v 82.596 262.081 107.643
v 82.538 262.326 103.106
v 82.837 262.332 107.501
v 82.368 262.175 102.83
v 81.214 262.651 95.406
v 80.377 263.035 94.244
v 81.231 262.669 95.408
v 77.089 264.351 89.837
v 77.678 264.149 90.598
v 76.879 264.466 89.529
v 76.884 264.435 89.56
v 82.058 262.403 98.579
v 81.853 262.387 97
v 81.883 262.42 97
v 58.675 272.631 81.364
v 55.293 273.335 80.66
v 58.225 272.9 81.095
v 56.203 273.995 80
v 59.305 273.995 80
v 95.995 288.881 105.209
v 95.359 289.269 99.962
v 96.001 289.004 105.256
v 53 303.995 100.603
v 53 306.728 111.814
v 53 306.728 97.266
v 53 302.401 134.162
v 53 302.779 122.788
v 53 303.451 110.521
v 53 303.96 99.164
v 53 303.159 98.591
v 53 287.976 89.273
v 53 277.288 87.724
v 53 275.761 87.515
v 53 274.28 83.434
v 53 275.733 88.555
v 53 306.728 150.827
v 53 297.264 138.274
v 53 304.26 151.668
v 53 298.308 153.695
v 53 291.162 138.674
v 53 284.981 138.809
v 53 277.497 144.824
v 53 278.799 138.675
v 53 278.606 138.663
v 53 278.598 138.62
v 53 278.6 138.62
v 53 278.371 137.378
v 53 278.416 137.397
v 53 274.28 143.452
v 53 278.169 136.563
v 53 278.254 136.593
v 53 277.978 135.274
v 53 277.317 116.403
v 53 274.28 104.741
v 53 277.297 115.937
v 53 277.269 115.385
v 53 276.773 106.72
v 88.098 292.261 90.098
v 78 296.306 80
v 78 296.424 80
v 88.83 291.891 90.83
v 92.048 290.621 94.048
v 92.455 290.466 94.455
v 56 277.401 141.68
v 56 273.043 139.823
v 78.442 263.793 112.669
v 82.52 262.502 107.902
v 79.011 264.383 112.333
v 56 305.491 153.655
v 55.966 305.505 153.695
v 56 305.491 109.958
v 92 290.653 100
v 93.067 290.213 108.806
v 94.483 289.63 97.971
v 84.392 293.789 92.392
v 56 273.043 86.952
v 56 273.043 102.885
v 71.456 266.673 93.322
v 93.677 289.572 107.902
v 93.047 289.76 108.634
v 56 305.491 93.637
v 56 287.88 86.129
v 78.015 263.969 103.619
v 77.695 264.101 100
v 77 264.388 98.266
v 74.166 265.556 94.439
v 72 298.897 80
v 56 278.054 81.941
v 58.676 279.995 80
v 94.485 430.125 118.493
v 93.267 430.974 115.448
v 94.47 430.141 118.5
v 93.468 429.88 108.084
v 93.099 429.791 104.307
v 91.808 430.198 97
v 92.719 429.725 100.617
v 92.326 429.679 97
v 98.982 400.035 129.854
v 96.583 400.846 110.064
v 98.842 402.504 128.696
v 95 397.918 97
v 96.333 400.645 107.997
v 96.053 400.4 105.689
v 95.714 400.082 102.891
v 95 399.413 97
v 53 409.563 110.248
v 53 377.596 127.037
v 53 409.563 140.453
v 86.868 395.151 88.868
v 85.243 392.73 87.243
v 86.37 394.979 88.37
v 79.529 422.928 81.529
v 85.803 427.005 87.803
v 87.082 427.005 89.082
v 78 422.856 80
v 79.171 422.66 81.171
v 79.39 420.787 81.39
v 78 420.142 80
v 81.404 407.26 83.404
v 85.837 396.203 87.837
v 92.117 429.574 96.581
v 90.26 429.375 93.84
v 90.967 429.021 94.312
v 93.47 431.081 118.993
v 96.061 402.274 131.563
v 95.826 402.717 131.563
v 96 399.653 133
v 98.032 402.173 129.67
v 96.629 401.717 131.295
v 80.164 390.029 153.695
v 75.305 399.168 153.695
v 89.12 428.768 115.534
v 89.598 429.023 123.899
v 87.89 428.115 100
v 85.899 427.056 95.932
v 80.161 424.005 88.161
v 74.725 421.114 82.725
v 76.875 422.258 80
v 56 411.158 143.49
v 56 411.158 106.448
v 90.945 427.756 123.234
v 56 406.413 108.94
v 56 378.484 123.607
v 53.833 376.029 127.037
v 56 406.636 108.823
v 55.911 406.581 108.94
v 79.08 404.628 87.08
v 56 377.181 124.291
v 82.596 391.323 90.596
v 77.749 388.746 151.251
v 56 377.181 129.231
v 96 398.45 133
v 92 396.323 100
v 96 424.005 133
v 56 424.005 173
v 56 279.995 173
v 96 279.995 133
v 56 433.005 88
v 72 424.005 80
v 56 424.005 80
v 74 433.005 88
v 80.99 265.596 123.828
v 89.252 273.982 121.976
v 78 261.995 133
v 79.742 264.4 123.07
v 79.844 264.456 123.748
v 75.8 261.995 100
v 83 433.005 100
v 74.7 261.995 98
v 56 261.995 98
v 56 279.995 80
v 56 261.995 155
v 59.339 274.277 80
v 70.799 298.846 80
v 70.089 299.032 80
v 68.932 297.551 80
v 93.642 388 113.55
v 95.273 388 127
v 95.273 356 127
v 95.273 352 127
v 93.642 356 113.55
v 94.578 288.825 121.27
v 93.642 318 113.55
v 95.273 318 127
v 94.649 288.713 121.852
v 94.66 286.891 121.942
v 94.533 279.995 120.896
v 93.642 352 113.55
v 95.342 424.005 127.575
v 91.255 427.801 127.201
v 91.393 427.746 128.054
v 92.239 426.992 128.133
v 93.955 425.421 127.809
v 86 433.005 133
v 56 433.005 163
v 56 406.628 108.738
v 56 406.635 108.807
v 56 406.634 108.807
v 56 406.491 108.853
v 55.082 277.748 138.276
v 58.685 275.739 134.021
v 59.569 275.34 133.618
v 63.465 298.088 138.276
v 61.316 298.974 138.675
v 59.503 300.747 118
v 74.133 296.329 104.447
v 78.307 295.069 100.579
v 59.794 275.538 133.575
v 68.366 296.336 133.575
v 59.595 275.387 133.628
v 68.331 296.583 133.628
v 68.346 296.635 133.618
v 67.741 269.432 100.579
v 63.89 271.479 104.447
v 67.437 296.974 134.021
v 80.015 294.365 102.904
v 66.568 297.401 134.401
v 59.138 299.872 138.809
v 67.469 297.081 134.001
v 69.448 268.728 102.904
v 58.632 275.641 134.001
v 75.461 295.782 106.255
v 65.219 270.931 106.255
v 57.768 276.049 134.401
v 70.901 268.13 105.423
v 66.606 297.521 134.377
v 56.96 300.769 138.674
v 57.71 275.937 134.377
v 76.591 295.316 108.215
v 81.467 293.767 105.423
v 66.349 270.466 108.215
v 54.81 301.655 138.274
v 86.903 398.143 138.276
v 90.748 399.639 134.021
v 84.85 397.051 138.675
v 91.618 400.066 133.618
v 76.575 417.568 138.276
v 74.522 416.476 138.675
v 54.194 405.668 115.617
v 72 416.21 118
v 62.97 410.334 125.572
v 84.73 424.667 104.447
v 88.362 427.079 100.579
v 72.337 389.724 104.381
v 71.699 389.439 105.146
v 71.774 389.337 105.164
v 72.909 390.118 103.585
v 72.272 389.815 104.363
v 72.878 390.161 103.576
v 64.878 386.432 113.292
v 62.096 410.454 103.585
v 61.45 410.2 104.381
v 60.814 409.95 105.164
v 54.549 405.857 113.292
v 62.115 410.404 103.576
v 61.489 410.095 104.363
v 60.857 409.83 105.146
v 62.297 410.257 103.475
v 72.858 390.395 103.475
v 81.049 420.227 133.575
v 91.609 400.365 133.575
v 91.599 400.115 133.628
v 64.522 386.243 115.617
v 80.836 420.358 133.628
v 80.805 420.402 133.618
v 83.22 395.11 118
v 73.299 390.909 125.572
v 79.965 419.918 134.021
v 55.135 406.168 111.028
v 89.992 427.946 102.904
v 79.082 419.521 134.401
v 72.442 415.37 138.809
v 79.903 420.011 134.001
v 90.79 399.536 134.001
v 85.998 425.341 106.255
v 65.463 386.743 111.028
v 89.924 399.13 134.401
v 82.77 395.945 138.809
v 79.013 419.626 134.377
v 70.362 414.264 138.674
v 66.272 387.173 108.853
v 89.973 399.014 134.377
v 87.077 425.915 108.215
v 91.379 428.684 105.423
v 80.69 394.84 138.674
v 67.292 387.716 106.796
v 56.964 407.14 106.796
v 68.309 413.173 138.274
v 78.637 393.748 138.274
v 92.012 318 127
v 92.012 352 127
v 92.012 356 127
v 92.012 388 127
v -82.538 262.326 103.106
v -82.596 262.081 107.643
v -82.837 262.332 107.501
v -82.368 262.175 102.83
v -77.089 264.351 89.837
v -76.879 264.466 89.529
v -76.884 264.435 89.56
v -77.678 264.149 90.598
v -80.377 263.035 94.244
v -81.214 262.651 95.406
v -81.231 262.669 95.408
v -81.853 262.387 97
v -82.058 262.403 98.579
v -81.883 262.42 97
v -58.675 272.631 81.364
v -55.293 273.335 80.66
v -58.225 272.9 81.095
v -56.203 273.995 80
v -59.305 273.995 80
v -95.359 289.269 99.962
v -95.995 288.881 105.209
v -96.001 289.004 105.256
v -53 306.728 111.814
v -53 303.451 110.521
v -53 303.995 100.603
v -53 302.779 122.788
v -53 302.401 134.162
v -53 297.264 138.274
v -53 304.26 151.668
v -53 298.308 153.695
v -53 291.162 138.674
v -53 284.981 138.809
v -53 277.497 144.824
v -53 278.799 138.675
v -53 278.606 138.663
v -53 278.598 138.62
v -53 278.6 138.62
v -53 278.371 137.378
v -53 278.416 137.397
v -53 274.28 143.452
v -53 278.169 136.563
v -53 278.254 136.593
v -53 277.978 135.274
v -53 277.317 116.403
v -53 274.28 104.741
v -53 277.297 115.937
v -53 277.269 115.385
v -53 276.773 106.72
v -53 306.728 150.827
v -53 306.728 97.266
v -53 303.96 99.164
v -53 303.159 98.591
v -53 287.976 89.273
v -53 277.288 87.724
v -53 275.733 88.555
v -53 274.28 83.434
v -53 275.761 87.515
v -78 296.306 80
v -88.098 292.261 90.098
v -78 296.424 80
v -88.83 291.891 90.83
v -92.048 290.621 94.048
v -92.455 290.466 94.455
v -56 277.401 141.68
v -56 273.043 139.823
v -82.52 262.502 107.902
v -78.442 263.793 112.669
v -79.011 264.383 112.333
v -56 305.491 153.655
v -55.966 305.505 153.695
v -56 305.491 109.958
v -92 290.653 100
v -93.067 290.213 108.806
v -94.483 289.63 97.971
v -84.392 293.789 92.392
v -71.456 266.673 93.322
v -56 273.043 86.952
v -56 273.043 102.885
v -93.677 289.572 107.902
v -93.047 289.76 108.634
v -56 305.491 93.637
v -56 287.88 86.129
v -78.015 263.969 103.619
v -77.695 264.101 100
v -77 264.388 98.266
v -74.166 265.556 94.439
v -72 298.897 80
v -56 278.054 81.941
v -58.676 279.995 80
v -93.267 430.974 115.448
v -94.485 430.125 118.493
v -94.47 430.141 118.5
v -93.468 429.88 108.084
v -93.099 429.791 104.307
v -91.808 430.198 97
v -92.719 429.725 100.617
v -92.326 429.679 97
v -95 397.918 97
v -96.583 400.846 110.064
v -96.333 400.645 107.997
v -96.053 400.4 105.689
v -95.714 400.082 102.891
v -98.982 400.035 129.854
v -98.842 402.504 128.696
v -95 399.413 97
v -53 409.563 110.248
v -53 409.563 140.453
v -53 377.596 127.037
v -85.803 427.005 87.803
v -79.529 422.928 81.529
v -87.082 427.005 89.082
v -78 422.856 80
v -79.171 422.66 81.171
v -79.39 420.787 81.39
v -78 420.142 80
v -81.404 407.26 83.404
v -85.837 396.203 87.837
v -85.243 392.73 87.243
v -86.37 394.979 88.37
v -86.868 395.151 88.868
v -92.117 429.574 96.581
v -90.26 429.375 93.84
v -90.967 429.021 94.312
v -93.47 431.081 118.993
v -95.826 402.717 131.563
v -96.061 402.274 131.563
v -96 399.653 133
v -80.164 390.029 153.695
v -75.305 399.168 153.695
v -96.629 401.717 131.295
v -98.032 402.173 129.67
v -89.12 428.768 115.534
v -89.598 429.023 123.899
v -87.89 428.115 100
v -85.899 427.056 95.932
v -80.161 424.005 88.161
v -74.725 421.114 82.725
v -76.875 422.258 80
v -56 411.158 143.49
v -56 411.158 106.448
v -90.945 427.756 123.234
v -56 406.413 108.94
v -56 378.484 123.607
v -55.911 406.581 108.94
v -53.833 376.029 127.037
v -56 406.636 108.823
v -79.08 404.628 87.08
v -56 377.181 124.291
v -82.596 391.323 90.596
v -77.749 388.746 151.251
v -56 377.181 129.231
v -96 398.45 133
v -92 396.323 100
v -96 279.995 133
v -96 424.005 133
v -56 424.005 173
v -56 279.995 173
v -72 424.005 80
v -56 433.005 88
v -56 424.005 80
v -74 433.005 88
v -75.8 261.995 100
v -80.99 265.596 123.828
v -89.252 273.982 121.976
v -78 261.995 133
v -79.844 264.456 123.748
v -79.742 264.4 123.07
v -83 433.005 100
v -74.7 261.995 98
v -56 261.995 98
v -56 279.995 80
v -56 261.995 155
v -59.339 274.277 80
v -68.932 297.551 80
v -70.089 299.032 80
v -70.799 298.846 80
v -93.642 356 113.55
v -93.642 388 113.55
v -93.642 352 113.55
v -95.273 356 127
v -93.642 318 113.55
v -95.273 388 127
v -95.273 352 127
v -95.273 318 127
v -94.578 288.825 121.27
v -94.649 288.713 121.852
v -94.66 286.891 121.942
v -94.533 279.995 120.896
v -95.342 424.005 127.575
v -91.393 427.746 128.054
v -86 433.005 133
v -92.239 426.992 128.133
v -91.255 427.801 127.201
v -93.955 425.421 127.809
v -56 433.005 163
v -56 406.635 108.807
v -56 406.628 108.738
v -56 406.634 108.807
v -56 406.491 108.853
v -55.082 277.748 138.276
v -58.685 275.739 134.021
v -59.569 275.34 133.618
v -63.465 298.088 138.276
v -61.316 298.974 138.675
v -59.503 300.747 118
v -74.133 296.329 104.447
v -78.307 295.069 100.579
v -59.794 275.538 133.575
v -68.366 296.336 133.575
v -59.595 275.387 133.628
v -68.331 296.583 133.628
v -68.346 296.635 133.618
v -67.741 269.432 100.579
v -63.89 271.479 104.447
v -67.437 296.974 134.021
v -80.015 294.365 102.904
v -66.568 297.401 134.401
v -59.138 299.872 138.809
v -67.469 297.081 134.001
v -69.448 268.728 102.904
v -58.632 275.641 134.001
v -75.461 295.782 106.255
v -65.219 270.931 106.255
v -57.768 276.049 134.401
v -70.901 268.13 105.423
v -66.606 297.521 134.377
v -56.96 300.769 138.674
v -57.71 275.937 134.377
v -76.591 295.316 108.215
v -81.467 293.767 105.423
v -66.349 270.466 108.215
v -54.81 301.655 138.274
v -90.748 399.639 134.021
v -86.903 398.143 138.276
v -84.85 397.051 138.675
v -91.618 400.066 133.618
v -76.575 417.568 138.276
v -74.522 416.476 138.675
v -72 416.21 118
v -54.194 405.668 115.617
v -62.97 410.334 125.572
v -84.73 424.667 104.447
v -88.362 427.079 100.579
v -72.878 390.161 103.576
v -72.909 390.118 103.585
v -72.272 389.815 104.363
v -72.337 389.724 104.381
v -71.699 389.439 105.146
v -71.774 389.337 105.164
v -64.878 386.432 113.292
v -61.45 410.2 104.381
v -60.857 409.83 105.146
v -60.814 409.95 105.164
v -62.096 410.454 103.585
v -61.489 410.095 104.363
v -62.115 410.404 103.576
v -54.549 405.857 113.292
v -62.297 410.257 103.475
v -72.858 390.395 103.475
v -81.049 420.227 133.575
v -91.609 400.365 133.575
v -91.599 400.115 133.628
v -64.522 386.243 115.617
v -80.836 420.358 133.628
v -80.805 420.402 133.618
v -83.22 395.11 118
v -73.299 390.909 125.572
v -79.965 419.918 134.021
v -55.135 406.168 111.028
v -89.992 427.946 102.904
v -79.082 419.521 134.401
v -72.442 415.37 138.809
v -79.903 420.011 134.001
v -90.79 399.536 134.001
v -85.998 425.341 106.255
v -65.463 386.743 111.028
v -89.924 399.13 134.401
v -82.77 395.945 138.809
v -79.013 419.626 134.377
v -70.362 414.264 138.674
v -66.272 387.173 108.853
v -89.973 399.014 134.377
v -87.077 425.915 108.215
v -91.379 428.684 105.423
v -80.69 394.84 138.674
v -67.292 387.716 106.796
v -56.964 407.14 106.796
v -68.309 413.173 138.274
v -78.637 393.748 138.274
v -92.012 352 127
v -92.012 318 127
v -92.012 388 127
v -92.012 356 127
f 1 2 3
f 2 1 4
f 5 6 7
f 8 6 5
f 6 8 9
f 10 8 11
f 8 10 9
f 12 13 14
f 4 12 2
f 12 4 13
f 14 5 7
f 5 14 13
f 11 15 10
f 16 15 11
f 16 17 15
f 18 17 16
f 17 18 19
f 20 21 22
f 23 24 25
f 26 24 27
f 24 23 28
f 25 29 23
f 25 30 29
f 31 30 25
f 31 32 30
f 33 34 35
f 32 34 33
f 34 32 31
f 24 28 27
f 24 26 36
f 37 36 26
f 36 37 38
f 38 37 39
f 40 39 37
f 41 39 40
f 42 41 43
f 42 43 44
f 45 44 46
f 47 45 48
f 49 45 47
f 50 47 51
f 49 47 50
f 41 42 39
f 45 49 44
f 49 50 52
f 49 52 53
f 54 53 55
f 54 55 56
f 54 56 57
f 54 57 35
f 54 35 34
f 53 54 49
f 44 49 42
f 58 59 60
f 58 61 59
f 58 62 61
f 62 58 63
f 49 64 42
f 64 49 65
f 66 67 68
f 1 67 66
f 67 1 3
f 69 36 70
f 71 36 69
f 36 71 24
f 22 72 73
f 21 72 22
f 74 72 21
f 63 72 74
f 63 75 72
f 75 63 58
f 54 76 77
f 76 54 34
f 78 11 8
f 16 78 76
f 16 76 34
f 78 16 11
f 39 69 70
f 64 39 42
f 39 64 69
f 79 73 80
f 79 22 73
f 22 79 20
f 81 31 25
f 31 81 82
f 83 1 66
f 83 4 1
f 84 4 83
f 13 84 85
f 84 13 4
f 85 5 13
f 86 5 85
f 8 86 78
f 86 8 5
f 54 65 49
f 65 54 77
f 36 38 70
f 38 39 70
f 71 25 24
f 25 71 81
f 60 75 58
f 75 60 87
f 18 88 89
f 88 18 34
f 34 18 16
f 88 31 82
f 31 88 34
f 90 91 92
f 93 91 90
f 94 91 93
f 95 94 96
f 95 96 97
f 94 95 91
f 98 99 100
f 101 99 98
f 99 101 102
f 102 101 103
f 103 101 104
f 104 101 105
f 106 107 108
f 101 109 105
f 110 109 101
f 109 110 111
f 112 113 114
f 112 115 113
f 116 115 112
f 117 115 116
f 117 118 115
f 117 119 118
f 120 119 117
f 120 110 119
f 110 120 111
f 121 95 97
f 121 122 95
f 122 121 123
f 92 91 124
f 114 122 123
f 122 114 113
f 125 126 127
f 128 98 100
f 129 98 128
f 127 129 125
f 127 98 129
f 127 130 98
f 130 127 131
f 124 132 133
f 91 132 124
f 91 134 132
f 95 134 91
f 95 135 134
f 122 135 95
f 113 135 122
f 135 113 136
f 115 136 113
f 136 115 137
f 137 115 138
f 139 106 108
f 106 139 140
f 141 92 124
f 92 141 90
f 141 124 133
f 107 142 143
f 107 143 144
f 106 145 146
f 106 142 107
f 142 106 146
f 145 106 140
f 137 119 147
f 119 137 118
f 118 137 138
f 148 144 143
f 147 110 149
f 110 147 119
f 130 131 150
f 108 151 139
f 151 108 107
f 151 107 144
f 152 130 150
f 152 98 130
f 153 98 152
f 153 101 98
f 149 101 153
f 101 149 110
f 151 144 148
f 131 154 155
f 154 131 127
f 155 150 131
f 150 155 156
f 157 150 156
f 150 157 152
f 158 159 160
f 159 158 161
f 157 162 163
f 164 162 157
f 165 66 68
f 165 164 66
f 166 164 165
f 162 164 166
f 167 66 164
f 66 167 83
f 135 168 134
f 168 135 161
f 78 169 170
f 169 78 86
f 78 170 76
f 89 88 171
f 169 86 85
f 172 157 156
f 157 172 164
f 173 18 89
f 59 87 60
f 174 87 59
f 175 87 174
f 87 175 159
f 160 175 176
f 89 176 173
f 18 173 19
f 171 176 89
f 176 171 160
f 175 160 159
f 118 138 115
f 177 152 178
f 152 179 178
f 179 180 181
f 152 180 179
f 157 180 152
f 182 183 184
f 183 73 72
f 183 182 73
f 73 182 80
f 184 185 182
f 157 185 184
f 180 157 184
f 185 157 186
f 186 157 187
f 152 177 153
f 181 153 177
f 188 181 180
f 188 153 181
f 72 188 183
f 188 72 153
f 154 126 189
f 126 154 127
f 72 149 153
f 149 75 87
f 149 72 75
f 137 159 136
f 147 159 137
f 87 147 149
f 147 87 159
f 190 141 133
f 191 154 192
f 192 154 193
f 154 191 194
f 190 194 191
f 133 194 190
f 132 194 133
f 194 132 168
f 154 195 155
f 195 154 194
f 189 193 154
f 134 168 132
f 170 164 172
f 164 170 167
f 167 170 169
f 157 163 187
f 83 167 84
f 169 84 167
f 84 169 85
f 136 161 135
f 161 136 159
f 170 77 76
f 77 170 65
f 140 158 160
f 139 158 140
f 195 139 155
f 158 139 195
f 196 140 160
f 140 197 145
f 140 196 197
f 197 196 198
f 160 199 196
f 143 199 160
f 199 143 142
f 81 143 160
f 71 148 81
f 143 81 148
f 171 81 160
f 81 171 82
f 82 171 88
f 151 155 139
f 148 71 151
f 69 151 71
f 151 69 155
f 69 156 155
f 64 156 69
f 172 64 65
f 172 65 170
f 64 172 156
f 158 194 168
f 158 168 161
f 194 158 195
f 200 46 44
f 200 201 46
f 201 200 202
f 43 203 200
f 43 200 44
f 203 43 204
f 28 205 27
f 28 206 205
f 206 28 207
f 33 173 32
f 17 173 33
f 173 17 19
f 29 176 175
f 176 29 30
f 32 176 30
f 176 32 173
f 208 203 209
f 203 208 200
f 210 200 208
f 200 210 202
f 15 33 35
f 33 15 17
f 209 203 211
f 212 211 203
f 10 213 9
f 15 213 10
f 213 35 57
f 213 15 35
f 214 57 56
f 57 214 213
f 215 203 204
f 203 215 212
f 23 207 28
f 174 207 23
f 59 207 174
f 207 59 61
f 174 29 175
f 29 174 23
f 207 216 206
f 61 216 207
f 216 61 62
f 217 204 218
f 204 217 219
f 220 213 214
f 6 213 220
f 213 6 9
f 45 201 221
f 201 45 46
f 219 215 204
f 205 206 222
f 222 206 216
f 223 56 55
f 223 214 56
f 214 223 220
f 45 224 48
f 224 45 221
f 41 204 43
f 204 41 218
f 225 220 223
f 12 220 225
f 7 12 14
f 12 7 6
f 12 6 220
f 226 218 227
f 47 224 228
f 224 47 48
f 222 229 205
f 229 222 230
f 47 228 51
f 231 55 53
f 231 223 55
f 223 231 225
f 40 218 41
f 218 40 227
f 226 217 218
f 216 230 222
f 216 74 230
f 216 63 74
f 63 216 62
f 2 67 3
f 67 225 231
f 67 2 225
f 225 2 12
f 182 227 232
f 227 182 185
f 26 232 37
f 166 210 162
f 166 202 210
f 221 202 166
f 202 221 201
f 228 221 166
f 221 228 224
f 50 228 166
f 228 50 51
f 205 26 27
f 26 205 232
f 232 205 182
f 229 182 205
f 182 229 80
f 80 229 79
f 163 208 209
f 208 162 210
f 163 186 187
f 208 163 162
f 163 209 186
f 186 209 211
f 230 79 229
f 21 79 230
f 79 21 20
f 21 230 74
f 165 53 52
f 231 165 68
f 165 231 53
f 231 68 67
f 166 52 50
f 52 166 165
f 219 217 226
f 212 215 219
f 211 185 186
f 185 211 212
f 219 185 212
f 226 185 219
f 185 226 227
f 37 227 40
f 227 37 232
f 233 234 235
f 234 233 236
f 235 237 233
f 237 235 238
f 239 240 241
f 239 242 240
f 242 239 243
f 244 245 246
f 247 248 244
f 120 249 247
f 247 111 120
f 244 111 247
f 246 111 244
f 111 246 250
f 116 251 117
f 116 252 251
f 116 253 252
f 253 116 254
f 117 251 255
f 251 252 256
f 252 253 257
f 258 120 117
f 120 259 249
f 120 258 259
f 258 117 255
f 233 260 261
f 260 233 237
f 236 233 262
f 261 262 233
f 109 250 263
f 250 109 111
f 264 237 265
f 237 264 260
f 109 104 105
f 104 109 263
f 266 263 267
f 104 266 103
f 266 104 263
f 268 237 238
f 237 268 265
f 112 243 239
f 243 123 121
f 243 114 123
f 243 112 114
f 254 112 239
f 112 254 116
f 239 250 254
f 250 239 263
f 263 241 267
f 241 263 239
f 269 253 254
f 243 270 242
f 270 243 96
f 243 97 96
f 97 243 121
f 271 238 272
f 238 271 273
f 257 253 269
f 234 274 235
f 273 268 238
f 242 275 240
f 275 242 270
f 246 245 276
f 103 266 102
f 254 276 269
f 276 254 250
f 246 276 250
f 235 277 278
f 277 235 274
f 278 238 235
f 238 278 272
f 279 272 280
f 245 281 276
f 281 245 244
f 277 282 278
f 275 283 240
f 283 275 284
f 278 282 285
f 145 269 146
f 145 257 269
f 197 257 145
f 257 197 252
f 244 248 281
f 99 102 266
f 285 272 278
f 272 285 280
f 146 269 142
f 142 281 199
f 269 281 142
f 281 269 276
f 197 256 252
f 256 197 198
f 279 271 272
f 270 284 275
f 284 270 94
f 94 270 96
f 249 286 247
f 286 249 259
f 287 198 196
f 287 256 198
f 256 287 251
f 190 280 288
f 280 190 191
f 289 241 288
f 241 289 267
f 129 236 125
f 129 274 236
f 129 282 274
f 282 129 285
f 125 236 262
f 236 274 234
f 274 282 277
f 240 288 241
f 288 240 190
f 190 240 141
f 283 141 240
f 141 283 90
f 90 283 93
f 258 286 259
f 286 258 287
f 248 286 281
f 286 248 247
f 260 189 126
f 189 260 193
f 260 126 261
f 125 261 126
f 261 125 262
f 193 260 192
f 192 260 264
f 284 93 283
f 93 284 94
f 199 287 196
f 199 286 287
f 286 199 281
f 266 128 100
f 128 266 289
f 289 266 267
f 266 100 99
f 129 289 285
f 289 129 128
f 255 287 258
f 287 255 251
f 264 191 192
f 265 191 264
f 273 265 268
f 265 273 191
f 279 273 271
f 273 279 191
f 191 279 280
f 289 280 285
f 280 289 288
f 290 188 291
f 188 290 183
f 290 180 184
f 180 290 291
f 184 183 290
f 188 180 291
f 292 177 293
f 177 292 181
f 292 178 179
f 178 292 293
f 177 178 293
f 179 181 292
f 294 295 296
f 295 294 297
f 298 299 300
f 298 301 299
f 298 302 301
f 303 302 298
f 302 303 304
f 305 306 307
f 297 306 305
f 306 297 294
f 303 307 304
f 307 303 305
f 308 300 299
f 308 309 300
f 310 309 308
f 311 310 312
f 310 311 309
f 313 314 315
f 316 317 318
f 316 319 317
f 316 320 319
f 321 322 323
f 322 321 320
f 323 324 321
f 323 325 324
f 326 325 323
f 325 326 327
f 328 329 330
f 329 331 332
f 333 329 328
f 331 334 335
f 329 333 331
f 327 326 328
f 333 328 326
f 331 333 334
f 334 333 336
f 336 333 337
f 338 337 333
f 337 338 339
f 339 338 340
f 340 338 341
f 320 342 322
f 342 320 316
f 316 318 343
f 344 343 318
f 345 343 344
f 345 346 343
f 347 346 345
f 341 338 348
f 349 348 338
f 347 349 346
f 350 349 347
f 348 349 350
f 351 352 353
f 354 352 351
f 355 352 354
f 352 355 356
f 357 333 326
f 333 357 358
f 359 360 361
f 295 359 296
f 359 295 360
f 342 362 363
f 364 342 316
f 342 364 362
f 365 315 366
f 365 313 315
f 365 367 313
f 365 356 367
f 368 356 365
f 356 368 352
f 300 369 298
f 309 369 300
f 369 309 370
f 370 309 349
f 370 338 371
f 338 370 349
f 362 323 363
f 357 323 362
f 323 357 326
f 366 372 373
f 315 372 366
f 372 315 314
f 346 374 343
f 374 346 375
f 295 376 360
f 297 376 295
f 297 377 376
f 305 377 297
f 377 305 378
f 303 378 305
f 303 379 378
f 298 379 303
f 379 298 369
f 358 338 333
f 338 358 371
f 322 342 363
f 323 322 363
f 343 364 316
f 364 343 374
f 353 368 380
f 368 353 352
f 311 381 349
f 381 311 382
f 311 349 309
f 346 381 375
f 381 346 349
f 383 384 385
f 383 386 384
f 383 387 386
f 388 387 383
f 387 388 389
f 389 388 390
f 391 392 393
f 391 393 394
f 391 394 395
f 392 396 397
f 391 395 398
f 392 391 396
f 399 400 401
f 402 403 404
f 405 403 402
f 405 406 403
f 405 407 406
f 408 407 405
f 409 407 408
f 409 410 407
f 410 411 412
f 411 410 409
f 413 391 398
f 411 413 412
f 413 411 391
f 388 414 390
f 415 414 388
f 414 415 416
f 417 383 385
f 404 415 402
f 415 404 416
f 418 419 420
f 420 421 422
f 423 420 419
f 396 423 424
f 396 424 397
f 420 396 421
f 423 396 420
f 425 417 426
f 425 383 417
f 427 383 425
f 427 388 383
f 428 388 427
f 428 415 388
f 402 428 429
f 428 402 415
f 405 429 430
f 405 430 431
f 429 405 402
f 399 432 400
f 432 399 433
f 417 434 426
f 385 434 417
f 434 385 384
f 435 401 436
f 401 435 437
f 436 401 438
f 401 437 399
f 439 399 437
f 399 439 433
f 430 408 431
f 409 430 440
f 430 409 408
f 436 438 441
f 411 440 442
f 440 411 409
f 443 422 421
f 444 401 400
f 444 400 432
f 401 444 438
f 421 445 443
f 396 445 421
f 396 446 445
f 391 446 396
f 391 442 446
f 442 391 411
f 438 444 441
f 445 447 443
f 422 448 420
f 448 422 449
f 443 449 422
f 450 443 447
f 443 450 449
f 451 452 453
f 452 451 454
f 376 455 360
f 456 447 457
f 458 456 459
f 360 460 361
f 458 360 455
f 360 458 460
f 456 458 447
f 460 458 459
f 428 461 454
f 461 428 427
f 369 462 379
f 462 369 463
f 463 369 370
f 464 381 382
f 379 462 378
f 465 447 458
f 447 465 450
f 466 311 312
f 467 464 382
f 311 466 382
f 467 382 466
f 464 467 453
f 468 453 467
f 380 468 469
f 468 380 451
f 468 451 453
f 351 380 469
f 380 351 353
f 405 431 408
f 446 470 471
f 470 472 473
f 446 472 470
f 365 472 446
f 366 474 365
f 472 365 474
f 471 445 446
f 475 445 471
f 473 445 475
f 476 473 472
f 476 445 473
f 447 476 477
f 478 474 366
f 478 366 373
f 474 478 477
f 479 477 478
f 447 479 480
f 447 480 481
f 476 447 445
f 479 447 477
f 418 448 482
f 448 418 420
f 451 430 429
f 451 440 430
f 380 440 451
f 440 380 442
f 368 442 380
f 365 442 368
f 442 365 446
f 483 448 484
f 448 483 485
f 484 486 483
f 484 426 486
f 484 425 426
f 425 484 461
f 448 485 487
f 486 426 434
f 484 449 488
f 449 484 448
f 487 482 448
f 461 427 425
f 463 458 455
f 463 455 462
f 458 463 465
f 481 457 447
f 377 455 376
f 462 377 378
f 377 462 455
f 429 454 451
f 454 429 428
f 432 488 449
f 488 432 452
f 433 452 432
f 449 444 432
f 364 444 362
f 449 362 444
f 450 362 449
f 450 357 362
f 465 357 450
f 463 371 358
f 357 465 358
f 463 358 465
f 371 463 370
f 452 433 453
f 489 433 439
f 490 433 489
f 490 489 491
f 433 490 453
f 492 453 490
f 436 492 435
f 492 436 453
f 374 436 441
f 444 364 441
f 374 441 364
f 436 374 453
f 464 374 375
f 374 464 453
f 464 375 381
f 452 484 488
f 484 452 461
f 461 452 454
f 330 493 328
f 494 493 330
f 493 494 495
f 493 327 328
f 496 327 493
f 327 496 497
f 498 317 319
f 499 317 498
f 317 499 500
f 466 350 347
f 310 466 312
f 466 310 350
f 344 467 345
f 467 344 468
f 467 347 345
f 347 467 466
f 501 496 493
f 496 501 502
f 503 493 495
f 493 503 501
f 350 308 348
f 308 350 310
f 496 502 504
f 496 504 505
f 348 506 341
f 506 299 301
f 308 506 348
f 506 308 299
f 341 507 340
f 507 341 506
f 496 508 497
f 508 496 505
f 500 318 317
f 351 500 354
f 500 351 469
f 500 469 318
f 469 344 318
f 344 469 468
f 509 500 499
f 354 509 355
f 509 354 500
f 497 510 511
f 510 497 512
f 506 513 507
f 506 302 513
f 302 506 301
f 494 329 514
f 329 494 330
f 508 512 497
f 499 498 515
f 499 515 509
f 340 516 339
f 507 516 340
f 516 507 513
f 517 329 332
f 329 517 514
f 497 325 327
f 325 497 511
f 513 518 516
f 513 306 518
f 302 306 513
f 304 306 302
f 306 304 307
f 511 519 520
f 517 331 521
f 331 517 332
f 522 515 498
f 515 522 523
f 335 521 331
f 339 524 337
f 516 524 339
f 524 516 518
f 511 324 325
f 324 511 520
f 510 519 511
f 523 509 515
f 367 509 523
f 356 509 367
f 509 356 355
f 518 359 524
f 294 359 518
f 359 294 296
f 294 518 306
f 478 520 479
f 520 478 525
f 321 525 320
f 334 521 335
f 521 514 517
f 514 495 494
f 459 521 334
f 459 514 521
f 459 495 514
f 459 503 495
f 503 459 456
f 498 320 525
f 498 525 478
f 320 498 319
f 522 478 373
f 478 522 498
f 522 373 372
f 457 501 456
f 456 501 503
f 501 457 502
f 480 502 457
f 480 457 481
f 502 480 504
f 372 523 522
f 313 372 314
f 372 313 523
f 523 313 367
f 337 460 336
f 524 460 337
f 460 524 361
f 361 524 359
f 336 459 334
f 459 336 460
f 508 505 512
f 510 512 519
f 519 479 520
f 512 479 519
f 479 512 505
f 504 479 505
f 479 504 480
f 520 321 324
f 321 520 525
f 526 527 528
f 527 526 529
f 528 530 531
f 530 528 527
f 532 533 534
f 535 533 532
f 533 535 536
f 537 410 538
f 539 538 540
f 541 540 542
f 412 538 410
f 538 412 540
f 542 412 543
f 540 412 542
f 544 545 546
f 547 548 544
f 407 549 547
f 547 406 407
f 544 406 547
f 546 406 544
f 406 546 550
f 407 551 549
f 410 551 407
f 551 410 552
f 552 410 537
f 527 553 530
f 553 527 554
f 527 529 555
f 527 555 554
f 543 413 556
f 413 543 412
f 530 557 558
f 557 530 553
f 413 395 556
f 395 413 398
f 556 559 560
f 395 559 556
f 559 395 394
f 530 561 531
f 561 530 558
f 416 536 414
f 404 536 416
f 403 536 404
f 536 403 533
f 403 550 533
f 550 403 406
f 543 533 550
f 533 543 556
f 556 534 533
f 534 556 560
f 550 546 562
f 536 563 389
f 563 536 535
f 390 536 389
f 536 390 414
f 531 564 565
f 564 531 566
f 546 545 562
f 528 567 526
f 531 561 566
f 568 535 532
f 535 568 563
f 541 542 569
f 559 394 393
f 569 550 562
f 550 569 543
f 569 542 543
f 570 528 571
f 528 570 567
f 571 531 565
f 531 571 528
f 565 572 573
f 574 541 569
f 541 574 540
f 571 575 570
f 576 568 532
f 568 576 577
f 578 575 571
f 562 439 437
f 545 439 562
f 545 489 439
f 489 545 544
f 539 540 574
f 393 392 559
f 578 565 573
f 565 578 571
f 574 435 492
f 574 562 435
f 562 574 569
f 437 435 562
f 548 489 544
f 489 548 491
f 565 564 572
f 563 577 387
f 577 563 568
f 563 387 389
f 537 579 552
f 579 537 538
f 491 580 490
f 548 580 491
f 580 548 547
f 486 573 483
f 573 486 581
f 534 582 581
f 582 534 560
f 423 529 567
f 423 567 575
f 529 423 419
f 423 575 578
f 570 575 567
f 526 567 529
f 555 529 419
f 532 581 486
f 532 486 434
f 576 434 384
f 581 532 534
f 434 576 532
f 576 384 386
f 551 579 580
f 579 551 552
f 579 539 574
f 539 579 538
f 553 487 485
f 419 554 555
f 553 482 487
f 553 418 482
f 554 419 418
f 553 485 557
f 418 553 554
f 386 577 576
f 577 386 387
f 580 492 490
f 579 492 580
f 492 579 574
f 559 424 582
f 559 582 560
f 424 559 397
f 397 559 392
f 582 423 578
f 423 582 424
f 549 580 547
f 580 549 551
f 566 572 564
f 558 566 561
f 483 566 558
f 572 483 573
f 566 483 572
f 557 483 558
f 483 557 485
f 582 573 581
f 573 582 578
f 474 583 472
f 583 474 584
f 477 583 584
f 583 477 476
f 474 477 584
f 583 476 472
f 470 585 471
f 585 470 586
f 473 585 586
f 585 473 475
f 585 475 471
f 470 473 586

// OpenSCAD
// file: ../hull_datums.scad
// hull_datums.scad -- GENERATED by tools/hull_datums.py --write-scad.
// Do not edit: change tools/hull_datums.py and regenerate.
// Aircraft datum R2: origin centreline / nose tip / ground plane on the
// 3.0 in gear; X = +port, Y = +aft, Z = +dorsal (mm).
X_CL = 0.0000;
Y_NOSE = 0.0000;
GROUND_Z_3IN = 0.0000;
BELLY_Z = 80.0000;
WING_LE_ROOT_Y = 311.4000;
SPAR_Y = 339.4000;
SPAR_Z = 146.8510;
SHAFT_Y = 365.0000;
CARGO_BAY_Y_FWD = 304.7000;
CARGO_BAY_Y_AFT = 410.7000;
// main file
// gear_box_canonical_concept.scad -- CONCEPT envelope of the canonical
// landing-gear box (cargo-flank "gear sponson") and its leg-support pillars.
//
// STATUS: CONCEPT / appearance study only (2026-11-01).  NOT integrated:
// no keep-outs, no bolt pattern, no wall/shell, no mass.  It exists so the
// owner can approve the LOOK before the integration work in
// docs/plans/2026-11-01-001-feat-canonical-gear-box-plan.md.
//
// Problem it answers (owner, 2026-11-01): the Rev R6/A1B bays are open bolt
// frames on the 25 deg sponson panel; the thigh hub hangs in free air below
// them, so there is a visible gap between the bottom of each leg support and
// the hull, and the bay reads as a box added onto a different design.
//
// Canonical form, read from Nick Henning's model [REF-CAD-HENNING]:
//   * nick-henning-uvdisplay-wing.jpg -- the stub wing IS the top plate; the
//     gear box hangs under it as a faceted block whose outboard face leans in
//     toward a bevelled lower chine, with recessed panels and an angled hatch.
//   * nick-henning-close-gear-combine.jpg -- each thigh is SLEEVED in a square
//     leg-support pillar that lands on the box; the thigh emerges from the
//     pillar mouth, so support and hull read as one structure.
//   * nick-henning-uvdisplay-gear.jpg -- the upper-leg housing is a square
//     tube coaxial with the thigh.
//
// Frame: aircraft datum R2 (tools/hull_datums.py): X lateral (port = +X),
// Y aft, Z up, mm.  Built for PORT and mirrored about X_CL for starboard.
// Corner poses are COPIED from merge_cargo_interior.py LG_CORNERS /
// canonical_leg_r6_3_0in.scad CORNERS (R2) -- the integration step shall
// read them from one source instead (plan U2).
//
// Author: Claude (Claude Opus 5.5, Anthropic) under the direction of
// Stab-Rabbit-coding, per AGENTS.md AI attribution.
// License: CERN-OHL-P-2.0 (hardware source) -- see repo LICENSE files.

PART = "both";          // "port" | "stbd" | "both"
include <../hull_datums.scad>   // X_CL etc. (GENERATED from tools/hull_datums.py)

// [hip_x, hip_y, hip_z, swing_azimuth_deg] -- port rows, R2
FORE = [54.95, 289.70, 118.0, -22.4];
AFT  = [77.61, 405.66, 118.0,  28.0];

KNEE_L   = [59, 0, -66];  // leg-local knee centre (canonical_leg_r6_3_0in KNEE)
FLEX_MAX = 26;            // deg, gear stroke swept by the bay check

// --- box section (X, Z) at the full-depth stations --------------------------
BOX_Z_BOT   = 80.0;       // belly plane
BOX_Z_TOP   = 133.0;      // wing-root underside (wing is the canonical top plate)
// Owner 2026-11-01: no shelf in front of the wing root -- the box top is a
// face sloping up-inboard from the outboard face edge at TOP_SLOPE, so it
// runs INTO the hull skin (a clean skin joint) wherever the wing is not
// above it.  Under the wing the top is then trimmed to the wing's own
// underside contour by tools/gear_box_concept_fit.py.
TOP_SLOPE   = 45;         // deg above horizontal
BOX_X_IN    = 56.0;       // inboard edge -- outboard of the door aperture (X 52.25)
BOX_X_FACE_T = 96.0;      // outboard face, top
BOX_X_FACE_B = 92.0;      // outboard face, bottom (face leans in, as canon)
BOX_Z_CHINE = 100.0;      // top of the bevelled lower chine
BOX_X_CHINE_B = 72.0;     // chine meets the bottom

Y_FWD_TIP = 262.0;        // fore face toe (sloped front face)
Y_FWD     = 280.0;        // full section begins
Y_AFT     = 424.0;        // full section ends
Y_AFT_TIP = 433.0;        // aft face, stops short of the cargo/middle collar (434.7)

// --- leg-support pillar (square sleeve coaxial with the static thigh) -------
PIL_W_SWING = 40.0;       // across the thigh, in the swing plane
PIL_W_PIN   = 30.0;       // along the hip pin
PIL_UP      = 30.0;       // run up/inboard of the hip (buried in the box)
PIL_DOWN    = 90.0;       // run down the thigh from the hip (clipped to the box)
SLOT_SWING  = 34.0;       // thigh cluster clearance (2 x O14 @ 18 + 2 mm)
SLOT_PIN    = 22.0;       // lug 14 + 2 x 4 mm, at the hip (narrow end)
// Owner 2026-11-01: the bay opening is TRAPEZOIDAL, as canon, and stays an
// OPEN slot.  It flares along the pin axis from SLOT_PIN at the hip to
// SLOT_PIN_MOUTH where the thigh leaves the box, so on the box face it reads as
// a trapezoid wide at the bottom (Henning close-gear: the leg recesses widen
// toward the chine).  34 = the Rev R6 aperture head width (BAY_APER_W_TOP).
SLOT_PIN_MOUTH = 34.0;
SLOT_FLARE_L   = 70.0;    // mm down the thigh over which the flare runs

function unit(v) = v / norm(v);
THIGH_ANG = atan2(-KNEE_L[2], KNEE_L[0]);   // 48.2 deg below local +x

module section(xs) {
    // xs scales the section outboard of BOX_X_IN (end tapers)
    function sx(x) = BOX_X_IN + (x - BOX_X_IN) * xs;
    polygon([[BOX_X_IN, BOX_Z_BOT], [sx(BOX_X_CHINE_B), BOX_Z_BOT],
             [sx(BOX_X_FACE_B), BOX_Z_CHINE], [sx(BOX_X_FACE_T), BOX_Z_TOP],
             [BOX_X_IN, BOX_Z_TOP + (sx(BOX_X_FACE_T) - BOX_X_IN) * tan(TOP_SLOPE)]]);
}

module slab(y, xs, zlift = 0) {
    // a 0.01 mm slab of the section at station y; zlift raises the bottom
    translate([0, y, 0]) rotate([90, 0, 0])
        linear_extrude(0.01, center = true)
            intersection() { section(xs);
                             translate([0, BOX_Z_BOT + zlift]) square([200, 200]); }
}

module box_envelope() {
    hull() {
        slab(Y_FWD_TIP, 0.55, 18);
        slab(Y_FWD, 1.0);
        slab(Y_AFT, 1.0);
        slab(Y_AFT_TIP, 0.75, 8);
    }
}

// Corner local frame: hip origin, +x outboard swing direction, +y pin axis.
module at_corner(c) {
    translate([c[0], c[1], c[2]]) rotate([0, 0, c[3]]) children();
}

PIL_PROUD = 3.0;          // pillar stands proud of the box faces by this much

module pillar(c) {
    // square sleeve along the static thigh, from PIL_UP above the hip to
    // PIL_DOWN down the thigh, CLIPPED to the box grown PIL_PROUD: the pillar
    // is a proud band on the box faces and its mouth lands ON the box (canon:
    // the thigh emerges from the support where it meets the hull -- no gap).
    intersection() {
        minkowski() { box_envelope(); cube(2 * PIL_PROUD, center = true); }
        pillar_raw(c);
    }
}

module pillar_raw(c) {
    at_corner(c) rotate([0, THIGH_ANG, 0])
        translate([-PIL_UP, -PIL_W_PIN / 2, -PIL_W_SWING / 2])
            cube([PIL_UP + PIL_DOWN, PIL_W_PIN, PIL_W_SWING]);
}

module swing_slot(c) {
    // thigh envelope swept 0..FLEX_MAX about the hip pin (flex splays the
    // knee outboard/up: a1b_rot in canonical_leg_r6_3_0in.scad)
    at_corner(c)
        for (f = [0 : FLEX_MAX / 4 : FLEX_MAX - 0.01])
            hull() for (g = [f, f + FLEX_MAX / 4])
                rotate([0, THIGH_ANG - g, 0]) slot_trapezoid();
}

module slot_trapezoid() {
    // slot section along the thigh: SLOT_PIN wide at the hip, flaring to
    // SLOT_PIN_MOUTH at SLOT_FLARE_L, then straight out past the box
    hull() {
        translate([-12, -SLOT_PIN / 2, -SLOT_SWING / 2])
            cube([0.01, SLOT_PIN, SLOT_SWING]);
        translate([SLOT_FLARE_L, -SLOT_PIN_MOUTH / 2, -SLOT_SWING / 2])
            cube([90, SLOT_PIN_MOUTH, SLOT_SWING]);
    }
}

module recess_panel(y0, y1) {
    // shallow canonical panel recess in the outboard face
    translate([BOX_X_FACE_T - 1.2, y0, BOX_Z_CHINE + 4])
        multmatrix([[1, 0, -(BOX_X_FACE_T - BOX_X_FACE_B) / (BOX_Z_TOP - BOX_Z_CHINE), 0],
                    [0, 1, 0, 0], [0, 0, 1, 0]])
            cube([6, y1 - y0, BOX_Z_TOP - BOX_Z_CHINE - 10]);
}

module gear_box_port() {
    difference() {
        union() {
            box_envelope();
            pillar(FORE);
            pillar(AFT);
        }
        swing_slot(FORE);
        swing_slot(AFT);
        recess_panel(318, 352);     // between the bays, canonical inspection panel
        recess_panel(356, 388);
        // keep everything above the belly plane
        translate([-500, 0, BOX_Z_BOT - 100]) cube([1000, 1000, 100]);
    }
}

module mirror_cl() {
    translate([X_CL, 0, 0]) mirror([1, 0, 0]) translate([-X_CL, 0, 0]) children();
}

if (PART == "port" || PART == "both") gear_box_port();
if (PART == "stbd" || PART == "both") mirror_cl() gear_box_port();
